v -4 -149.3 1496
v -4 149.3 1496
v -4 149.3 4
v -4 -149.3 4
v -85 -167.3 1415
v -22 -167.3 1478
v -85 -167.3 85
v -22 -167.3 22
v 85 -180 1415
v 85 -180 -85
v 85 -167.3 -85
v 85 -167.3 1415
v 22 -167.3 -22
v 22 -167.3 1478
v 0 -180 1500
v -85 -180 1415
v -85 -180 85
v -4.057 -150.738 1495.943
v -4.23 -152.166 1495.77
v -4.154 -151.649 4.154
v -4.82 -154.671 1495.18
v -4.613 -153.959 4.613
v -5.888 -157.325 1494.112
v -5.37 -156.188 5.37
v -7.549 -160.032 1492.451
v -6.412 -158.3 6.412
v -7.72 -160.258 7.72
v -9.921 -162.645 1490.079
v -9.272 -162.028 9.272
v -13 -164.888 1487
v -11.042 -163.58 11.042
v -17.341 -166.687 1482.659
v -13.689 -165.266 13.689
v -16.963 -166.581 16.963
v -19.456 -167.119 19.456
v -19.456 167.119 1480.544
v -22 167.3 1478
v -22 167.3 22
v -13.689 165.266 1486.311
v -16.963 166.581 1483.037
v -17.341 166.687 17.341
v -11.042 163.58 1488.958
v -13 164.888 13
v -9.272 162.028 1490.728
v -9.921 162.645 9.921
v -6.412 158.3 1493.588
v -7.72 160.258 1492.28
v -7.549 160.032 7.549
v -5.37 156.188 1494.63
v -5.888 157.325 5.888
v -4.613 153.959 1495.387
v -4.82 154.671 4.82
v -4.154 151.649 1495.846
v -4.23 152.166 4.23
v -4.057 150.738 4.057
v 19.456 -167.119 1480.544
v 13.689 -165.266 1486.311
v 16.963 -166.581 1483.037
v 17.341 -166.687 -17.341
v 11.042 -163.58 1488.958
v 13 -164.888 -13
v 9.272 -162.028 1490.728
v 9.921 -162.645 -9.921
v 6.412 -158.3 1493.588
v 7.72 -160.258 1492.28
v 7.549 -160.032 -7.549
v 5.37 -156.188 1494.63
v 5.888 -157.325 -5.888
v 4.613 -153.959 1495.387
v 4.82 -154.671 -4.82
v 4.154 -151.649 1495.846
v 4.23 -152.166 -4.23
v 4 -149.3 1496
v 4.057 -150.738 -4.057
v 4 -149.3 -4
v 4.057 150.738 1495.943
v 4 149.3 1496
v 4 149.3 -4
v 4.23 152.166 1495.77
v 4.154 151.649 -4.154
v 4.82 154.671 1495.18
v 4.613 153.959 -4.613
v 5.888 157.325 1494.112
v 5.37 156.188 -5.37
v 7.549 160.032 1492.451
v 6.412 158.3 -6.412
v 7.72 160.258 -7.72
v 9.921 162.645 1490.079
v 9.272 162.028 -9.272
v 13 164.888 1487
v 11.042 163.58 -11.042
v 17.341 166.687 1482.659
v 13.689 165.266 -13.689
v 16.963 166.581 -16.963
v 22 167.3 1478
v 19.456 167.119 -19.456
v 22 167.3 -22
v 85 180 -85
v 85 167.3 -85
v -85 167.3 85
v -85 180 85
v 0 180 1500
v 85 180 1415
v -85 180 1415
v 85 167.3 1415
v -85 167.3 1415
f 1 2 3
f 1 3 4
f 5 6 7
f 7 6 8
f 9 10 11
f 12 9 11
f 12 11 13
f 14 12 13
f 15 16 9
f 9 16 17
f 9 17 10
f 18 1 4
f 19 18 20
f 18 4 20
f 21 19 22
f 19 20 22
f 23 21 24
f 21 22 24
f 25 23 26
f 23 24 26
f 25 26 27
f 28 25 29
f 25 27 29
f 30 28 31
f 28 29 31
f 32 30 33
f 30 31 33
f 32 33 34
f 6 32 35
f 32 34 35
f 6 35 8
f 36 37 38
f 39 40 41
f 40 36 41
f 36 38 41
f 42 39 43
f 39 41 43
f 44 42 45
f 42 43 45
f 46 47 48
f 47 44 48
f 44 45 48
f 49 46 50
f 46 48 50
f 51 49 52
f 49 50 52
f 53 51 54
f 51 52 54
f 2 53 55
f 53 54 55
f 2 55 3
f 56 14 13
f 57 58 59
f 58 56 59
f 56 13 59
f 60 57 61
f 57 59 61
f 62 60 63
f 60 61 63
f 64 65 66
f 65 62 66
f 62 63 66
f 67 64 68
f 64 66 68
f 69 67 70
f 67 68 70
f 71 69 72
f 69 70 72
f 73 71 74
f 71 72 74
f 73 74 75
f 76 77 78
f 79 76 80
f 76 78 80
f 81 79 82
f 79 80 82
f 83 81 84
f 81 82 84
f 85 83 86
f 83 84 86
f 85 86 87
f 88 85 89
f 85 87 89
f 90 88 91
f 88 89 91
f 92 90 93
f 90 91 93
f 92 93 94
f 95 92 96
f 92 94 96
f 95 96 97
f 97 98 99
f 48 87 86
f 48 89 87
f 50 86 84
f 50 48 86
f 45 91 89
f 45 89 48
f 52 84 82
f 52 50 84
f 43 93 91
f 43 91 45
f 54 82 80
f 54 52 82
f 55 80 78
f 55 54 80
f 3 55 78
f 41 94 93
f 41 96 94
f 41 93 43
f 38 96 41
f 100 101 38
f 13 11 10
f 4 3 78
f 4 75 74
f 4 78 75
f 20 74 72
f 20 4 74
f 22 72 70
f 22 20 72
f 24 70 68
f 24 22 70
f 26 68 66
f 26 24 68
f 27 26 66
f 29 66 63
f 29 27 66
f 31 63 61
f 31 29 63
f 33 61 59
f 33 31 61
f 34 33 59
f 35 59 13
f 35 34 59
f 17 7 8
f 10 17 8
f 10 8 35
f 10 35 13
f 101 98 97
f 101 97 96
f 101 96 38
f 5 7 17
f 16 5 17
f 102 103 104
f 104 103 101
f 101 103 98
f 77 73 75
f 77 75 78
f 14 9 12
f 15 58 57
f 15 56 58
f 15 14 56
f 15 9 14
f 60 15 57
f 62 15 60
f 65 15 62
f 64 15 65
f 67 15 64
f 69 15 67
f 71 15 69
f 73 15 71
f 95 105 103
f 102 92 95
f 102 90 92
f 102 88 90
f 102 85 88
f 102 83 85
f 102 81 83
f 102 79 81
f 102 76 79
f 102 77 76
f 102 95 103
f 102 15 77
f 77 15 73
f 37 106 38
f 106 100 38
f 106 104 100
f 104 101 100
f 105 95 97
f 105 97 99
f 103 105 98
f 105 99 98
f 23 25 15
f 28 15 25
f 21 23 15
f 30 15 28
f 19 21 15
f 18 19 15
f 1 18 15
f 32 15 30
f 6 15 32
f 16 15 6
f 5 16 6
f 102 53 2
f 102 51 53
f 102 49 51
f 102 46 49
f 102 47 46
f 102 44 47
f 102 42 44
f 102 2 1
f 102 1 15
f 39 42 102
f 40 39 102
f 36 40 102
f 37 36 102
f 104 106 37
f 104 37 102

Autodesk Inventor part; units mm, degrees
ref_plane "Start Plane" through (0, 0, -85) normal (0, 0, 1) x (1, 0, 0)
ref_plane "End Plane" through (0, 0, 1500) normal (0, 0, 1) x (1, 0, 0)
sketch "Sketch" plane through (0, 0, 0) normal (0, 0, 1) x (1, 0, 0)
  line L0 (-85, 167.3) -> (-22, 167.3)
  line L1 (-85, 180) -> (-85, 167.3)
  line L2 (85, 180) -> (-85, 180)
  line L3 (85, 167.3) -> (85, 180)
  line L4 (22, 167.3) -> (85, 167.3)
  line L5 (4, -149.3) -> (4, 149.3)
  line L6 (85, -167.3) -> (22, -167.3)
  line L7 (85, -180) -> (85, -167.3)
  line L8 (-85, -167.3) -> (-85, -180)
  line L9 (-22, -167.3) -> (-85, -167.3)
  line L10 (-4, 149.3) -> (-4, -149.3)
  line L11 (0, -252) -> (0, 252) construction
  line L12 (-4, -167.3) -> (4, -167.3) construction
  arc A0 (-22, -167.3) -> (-4, -149.3) centre (-22, -149.3) ccw
  arc A1 (-4, 149.3) -> (-22, 167.3) centre (-22, 149.3) ccw
  arc A2 (22, 167.3) -> (4, 149.3) centre (22, 149.3) ccw
  arc A3 (4, -149.3) -> (22, -167.3) centre (22, -149.3) ccw
  line L13 (-119, 0) -> (119, 0) construction
  line L14 (-85, -180) -> (85, -180)
  point P0 (-4, 167.3)
  point P1 (4, 167.3)
  point P2 (0, 0)
  point P3 (0, -167.3)
  point P4 (0, 0)
  dimension "d1" = 360
  dimension "d3" = 12.7
  dimension "d5" = 8
  dimension "d7" = 170
  dimension "d13" = 18
  dimension "d14" = 180
  dimension "d15" = 85
extrude "Body" add sketch "Sketch" along normal up to surface (1585 mm away) from surface at -85
sketch "Sketch3" plane through (0, 0, 0) normal (0, 0, 1) x (1, 0, 0)
  line L0 (0, 0) -> (10, 0)
ref_plane "Work Plane3" through (0, 0, 0) normal (0, -1, 0) x (1, 0, 0)
ref_plane "Work Plane4" through (85, 0, 1585) normal (-0.7071, 0, 0.7071) x (0.7071, 0, 0.7071)
split "Split1" plane through (85, 0, 1585) removes the side toward (-0.7071, 0, 0.7071)
ref_plane "Work Plane5" through (85, 0, -85) normal (-0.7071, 0, -0.7071) x (-0.7071, 0, 0.7071)
split "Split2" plane through (85, 0, -85) removes the side toward (-0.7071, 0, -0.7071)
ref_plane "Work Plane6" through (-85, 0, 1585) normal (0.7071, 0, 0.7071) x (0.7071, 0, -0.7071)
split "Split3" plane through (-85, 0, 1585) removes the side toward (0.7071, 0, 0.7071)
sketch "Sketch4" plane through (0, 0, 0) normal (0, -1, 0) x (1, 0, 0)
  line L0 (-2, -85) -> (12, -85) projected
  line L1 (-2, 1500) -> (12, 1500) projected
  dimension "d19" = 1585
equation "\"d1\" = ParH"
equation "\"d3\" = t2"
equation "\"d5\" = t1"
equation "\"d7\" = b"
equation "\"d13\" = R1"
equation "\"d14\" = 0.5 * d1"
equation "\"d15\" = 0.5 * d7"
equation "\"d8\" = G_L"
equation "\"b\" = 170"
equation "\"ParH\" = 360"
equation "\"R1\" = 18"
equation "\"G_L\" = d19"
equation "\"t1\" = 8"
equation "\"t2\" = 12.7"
equation "\"G_OFFSET_START\" = 85"
equation "\"G_OFFSET_END\" = 0"
equation "\"d16\" = -G_OFFSET_START"
properties part number "DIN 1025 - IPE 360-1585" material "Steel, Mild"
